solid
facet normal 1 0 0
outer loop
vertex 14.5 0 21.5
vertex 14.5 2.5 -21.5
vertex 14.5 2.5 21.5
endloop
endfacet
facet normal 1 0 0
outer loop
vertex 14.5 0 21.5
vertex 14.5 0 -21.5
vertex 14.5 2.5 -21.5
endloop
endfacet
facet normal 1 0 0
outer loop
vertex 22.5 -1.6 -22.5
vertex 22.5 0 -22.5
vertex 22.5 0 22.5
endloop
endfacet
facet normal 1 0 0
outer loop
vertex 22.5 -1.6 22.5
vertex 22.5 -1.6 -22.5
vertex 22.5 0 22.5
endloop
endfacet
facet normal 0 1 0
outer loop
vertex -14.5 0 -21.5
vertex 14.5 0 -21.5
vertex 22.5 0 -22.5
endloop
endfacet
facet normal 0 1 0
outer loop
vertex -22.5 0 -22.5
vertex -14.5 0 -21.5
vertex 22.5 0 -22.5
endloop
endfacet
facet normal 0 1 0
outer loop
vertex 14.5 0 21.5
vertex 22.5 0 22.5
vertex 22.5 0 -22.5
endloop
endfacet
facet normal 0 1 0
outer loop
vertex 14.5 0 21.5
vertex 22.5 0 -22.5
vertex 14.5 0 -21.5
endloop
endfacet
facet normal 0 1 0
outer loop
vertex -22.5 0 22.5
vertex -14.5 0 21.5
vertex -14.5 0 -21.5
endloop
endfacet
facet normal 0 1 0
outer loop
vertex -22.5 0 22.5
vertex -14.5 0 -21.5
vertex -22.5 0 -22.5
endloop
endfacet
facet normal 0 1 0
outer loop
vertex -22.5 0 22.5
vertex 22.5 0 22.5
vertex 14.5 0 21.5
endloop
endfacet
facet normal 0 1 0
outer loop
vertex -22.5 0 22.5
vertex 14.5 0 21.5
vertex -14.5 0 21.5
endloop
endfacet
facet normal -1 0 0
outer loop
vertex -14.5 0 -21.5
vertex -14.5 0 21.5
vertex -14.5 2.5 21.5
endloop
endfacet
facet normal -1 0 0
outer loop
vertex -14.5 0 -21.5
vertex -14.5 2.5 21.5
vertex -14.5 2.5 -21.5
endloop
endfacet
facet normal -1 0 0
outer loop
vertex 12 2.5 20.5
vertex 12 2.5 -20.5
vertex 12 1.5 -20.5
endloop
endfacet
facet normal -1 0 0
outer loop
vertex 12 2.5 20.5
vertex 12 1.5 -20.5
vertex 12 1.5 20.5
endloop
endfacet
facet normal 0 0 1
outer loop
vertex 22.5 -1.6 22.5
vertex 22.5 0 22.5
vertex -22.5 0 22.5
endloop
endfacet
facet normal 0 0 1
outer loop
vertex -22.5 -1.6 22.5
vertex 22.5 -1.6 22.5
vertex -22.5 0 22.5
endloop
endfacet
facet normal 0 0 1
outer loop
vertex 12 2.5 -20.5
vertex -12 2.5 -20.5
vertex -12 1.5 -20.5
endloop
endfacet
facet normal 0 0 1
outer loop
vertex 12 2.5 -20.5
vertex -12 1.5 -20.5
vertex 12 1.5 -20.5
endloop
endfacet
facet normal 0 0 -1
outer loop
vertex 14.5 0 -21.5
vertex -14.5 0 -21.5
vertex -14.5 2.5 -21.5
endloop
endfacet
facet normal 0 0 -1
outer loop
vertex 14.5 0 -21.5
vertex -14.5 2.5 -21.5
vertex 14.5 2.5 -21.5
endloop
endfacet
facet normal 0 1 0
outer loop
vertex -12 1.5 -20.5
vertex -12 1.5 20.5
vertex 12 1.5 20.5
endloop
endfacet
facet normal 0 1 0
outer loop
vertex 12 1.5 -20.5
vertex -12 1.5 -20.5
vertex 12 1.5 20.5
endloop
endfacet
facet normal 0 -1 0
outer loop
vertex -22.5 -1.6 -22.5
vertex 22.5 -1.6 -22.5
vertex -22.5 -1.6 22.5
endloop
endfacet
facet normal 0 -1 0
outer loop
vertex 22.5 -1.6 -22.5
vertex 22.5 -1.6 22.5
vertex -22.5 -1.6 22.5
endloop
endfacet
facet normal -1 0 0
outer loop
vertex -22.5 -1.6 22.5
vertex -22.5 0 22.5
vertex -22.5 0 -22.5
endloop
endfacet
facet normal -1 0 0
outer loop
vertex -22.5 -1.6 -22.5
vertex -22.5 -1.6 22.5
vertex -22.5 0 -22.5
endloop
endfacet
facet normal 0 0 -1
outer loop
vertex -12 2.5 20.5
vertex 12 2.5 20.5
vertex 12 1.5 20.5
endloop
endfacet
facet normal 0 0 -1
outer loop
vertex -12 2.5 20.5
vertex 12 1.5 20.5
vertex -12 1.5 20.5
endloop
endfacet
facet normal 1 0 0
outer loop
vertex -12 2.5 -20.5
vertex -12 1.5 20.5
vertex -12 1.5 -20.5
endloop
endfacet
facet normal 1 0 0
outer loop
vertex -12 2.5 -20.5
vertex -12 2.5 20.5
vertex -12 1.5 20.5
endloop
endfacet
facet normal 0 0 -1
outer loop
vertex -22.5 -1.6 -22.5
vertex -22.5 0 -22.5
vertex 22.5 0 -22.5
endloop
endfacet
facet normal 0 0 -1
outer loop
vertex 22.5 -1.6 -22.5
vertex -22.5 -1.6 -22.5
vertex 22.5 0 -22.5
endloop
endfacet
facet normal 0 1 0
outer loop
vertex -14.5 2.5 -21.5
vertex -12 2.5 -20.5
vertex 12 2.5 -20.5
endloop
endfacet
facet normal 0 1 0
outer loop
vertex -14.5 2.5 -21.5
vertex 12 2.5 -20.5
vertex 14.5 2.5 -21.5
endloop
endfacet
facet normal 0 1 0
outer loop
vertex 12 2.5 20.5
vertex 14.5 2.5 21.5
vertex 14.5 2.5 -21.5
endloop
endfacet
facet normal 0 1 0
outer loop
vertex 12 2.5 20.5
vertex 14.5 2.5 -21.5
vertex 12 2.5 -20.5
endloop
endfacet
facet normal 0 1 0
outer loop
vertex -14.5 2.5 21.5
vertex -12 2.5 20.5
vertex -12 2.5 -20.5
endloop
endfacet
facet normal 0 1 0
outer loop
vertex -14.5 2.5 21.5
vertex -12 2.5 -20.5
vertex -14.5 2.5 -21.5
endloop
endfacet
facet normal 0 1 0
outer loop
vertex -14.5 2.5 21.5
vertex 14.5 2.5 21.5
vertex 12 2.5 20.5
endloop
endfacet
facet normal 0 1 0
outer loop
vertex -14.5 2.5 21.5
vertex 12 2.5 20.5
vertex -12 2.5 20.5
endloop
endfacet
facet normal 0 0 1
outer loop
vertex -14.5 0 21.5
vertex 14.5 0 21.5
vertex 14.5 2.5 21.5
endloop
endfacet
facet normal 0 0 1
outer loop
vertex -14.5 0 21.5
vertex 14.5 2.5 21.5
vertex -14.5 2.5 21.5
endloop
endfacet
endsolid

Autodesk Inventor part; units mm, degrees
ref_plane "YZ Plane" through (0, 0, 0) normal (1, 0, 0) x (0, 1, 0)
ref_plane "XZ Plane" through (0, 0, 0) normal (0, 1, 0) x (-1, 0, 0)
ref_plane "XY Plane" through (0, 0, 0) normal (0, 0, 1) x (1, 0, 0)
sketch "Sketch1" plane through (0, 0, 0) normal (0, 1, 0) x (-1, 0, 0)
  line L0 (-22.5, 22.5) -> (22.5, 22.5)
  line L1 (22.5, 22.5) -> (22.5, -22.5)
  line L2 (22.5, -22.5) -> (-22.5, -22.5)
  line L3 (-22.5, -22.5) -> (-22.5, 22.5)
  line L4 (-22.5, 22.5) -> (22.5, -22.5) construction
  line L5 (22.5, 22.5) -> (-22.5, -22.5) construction
  line L6 (-14.5, 21.5) -> (14.5, 21.5)
  line L7 (14.5, 21.5) -> (14.5, -21.5)
  line L8 (14.5, -21.5) -> (-14.5, -21.5)
  line L9 (-14.5, -21.5) -> (-14.5, 21.5)
  line L10 (-14.5, 21.5) -> (14.5, -21.5) construction
  line L11 (14.5, 21.5) -> (-14.5, -21.5) construction
  point P0 (0, 0)
  dimension "d0" = 45
  dimension "d1" = 45
  dimension "d2" = 29
  dimension "d3" = 43
extrude "Extrusion1" add sketch "Sketch1" against normal blind 1.6 contours L0 L1 L2 L3 | L6 L7 L8 L9
extrude "Extrusion2" add sketch "Sketch1" along normal blind 2.5 contours L6 L7 L8 L9
sketch "Sketch2" plane through (0, 2.5, 0) normal (0, 1, 0) x (1, 0, 0)
  line L0 (12, -20.5) -> (-12, -20.5)
  line L1 (-12, -20.5) -> (-12, 20.5)
  line L2 (-12, 20.5) -> (12, 20.5)
  line L3 (12, 20.5) -> (12, -20.5)
  line L4 (12, -20.5) -> (-12, 20.5) construction
  line L5 (-12, -20.5) -> (12, 20.5) construction
  point P0 (0, 0)
  dimension "d8" = 24
  dimension "d9" = 41
extrude "Extrusion3" cut sketch "Sketch2" against normal blind 1
properties part number "LCD5110"
